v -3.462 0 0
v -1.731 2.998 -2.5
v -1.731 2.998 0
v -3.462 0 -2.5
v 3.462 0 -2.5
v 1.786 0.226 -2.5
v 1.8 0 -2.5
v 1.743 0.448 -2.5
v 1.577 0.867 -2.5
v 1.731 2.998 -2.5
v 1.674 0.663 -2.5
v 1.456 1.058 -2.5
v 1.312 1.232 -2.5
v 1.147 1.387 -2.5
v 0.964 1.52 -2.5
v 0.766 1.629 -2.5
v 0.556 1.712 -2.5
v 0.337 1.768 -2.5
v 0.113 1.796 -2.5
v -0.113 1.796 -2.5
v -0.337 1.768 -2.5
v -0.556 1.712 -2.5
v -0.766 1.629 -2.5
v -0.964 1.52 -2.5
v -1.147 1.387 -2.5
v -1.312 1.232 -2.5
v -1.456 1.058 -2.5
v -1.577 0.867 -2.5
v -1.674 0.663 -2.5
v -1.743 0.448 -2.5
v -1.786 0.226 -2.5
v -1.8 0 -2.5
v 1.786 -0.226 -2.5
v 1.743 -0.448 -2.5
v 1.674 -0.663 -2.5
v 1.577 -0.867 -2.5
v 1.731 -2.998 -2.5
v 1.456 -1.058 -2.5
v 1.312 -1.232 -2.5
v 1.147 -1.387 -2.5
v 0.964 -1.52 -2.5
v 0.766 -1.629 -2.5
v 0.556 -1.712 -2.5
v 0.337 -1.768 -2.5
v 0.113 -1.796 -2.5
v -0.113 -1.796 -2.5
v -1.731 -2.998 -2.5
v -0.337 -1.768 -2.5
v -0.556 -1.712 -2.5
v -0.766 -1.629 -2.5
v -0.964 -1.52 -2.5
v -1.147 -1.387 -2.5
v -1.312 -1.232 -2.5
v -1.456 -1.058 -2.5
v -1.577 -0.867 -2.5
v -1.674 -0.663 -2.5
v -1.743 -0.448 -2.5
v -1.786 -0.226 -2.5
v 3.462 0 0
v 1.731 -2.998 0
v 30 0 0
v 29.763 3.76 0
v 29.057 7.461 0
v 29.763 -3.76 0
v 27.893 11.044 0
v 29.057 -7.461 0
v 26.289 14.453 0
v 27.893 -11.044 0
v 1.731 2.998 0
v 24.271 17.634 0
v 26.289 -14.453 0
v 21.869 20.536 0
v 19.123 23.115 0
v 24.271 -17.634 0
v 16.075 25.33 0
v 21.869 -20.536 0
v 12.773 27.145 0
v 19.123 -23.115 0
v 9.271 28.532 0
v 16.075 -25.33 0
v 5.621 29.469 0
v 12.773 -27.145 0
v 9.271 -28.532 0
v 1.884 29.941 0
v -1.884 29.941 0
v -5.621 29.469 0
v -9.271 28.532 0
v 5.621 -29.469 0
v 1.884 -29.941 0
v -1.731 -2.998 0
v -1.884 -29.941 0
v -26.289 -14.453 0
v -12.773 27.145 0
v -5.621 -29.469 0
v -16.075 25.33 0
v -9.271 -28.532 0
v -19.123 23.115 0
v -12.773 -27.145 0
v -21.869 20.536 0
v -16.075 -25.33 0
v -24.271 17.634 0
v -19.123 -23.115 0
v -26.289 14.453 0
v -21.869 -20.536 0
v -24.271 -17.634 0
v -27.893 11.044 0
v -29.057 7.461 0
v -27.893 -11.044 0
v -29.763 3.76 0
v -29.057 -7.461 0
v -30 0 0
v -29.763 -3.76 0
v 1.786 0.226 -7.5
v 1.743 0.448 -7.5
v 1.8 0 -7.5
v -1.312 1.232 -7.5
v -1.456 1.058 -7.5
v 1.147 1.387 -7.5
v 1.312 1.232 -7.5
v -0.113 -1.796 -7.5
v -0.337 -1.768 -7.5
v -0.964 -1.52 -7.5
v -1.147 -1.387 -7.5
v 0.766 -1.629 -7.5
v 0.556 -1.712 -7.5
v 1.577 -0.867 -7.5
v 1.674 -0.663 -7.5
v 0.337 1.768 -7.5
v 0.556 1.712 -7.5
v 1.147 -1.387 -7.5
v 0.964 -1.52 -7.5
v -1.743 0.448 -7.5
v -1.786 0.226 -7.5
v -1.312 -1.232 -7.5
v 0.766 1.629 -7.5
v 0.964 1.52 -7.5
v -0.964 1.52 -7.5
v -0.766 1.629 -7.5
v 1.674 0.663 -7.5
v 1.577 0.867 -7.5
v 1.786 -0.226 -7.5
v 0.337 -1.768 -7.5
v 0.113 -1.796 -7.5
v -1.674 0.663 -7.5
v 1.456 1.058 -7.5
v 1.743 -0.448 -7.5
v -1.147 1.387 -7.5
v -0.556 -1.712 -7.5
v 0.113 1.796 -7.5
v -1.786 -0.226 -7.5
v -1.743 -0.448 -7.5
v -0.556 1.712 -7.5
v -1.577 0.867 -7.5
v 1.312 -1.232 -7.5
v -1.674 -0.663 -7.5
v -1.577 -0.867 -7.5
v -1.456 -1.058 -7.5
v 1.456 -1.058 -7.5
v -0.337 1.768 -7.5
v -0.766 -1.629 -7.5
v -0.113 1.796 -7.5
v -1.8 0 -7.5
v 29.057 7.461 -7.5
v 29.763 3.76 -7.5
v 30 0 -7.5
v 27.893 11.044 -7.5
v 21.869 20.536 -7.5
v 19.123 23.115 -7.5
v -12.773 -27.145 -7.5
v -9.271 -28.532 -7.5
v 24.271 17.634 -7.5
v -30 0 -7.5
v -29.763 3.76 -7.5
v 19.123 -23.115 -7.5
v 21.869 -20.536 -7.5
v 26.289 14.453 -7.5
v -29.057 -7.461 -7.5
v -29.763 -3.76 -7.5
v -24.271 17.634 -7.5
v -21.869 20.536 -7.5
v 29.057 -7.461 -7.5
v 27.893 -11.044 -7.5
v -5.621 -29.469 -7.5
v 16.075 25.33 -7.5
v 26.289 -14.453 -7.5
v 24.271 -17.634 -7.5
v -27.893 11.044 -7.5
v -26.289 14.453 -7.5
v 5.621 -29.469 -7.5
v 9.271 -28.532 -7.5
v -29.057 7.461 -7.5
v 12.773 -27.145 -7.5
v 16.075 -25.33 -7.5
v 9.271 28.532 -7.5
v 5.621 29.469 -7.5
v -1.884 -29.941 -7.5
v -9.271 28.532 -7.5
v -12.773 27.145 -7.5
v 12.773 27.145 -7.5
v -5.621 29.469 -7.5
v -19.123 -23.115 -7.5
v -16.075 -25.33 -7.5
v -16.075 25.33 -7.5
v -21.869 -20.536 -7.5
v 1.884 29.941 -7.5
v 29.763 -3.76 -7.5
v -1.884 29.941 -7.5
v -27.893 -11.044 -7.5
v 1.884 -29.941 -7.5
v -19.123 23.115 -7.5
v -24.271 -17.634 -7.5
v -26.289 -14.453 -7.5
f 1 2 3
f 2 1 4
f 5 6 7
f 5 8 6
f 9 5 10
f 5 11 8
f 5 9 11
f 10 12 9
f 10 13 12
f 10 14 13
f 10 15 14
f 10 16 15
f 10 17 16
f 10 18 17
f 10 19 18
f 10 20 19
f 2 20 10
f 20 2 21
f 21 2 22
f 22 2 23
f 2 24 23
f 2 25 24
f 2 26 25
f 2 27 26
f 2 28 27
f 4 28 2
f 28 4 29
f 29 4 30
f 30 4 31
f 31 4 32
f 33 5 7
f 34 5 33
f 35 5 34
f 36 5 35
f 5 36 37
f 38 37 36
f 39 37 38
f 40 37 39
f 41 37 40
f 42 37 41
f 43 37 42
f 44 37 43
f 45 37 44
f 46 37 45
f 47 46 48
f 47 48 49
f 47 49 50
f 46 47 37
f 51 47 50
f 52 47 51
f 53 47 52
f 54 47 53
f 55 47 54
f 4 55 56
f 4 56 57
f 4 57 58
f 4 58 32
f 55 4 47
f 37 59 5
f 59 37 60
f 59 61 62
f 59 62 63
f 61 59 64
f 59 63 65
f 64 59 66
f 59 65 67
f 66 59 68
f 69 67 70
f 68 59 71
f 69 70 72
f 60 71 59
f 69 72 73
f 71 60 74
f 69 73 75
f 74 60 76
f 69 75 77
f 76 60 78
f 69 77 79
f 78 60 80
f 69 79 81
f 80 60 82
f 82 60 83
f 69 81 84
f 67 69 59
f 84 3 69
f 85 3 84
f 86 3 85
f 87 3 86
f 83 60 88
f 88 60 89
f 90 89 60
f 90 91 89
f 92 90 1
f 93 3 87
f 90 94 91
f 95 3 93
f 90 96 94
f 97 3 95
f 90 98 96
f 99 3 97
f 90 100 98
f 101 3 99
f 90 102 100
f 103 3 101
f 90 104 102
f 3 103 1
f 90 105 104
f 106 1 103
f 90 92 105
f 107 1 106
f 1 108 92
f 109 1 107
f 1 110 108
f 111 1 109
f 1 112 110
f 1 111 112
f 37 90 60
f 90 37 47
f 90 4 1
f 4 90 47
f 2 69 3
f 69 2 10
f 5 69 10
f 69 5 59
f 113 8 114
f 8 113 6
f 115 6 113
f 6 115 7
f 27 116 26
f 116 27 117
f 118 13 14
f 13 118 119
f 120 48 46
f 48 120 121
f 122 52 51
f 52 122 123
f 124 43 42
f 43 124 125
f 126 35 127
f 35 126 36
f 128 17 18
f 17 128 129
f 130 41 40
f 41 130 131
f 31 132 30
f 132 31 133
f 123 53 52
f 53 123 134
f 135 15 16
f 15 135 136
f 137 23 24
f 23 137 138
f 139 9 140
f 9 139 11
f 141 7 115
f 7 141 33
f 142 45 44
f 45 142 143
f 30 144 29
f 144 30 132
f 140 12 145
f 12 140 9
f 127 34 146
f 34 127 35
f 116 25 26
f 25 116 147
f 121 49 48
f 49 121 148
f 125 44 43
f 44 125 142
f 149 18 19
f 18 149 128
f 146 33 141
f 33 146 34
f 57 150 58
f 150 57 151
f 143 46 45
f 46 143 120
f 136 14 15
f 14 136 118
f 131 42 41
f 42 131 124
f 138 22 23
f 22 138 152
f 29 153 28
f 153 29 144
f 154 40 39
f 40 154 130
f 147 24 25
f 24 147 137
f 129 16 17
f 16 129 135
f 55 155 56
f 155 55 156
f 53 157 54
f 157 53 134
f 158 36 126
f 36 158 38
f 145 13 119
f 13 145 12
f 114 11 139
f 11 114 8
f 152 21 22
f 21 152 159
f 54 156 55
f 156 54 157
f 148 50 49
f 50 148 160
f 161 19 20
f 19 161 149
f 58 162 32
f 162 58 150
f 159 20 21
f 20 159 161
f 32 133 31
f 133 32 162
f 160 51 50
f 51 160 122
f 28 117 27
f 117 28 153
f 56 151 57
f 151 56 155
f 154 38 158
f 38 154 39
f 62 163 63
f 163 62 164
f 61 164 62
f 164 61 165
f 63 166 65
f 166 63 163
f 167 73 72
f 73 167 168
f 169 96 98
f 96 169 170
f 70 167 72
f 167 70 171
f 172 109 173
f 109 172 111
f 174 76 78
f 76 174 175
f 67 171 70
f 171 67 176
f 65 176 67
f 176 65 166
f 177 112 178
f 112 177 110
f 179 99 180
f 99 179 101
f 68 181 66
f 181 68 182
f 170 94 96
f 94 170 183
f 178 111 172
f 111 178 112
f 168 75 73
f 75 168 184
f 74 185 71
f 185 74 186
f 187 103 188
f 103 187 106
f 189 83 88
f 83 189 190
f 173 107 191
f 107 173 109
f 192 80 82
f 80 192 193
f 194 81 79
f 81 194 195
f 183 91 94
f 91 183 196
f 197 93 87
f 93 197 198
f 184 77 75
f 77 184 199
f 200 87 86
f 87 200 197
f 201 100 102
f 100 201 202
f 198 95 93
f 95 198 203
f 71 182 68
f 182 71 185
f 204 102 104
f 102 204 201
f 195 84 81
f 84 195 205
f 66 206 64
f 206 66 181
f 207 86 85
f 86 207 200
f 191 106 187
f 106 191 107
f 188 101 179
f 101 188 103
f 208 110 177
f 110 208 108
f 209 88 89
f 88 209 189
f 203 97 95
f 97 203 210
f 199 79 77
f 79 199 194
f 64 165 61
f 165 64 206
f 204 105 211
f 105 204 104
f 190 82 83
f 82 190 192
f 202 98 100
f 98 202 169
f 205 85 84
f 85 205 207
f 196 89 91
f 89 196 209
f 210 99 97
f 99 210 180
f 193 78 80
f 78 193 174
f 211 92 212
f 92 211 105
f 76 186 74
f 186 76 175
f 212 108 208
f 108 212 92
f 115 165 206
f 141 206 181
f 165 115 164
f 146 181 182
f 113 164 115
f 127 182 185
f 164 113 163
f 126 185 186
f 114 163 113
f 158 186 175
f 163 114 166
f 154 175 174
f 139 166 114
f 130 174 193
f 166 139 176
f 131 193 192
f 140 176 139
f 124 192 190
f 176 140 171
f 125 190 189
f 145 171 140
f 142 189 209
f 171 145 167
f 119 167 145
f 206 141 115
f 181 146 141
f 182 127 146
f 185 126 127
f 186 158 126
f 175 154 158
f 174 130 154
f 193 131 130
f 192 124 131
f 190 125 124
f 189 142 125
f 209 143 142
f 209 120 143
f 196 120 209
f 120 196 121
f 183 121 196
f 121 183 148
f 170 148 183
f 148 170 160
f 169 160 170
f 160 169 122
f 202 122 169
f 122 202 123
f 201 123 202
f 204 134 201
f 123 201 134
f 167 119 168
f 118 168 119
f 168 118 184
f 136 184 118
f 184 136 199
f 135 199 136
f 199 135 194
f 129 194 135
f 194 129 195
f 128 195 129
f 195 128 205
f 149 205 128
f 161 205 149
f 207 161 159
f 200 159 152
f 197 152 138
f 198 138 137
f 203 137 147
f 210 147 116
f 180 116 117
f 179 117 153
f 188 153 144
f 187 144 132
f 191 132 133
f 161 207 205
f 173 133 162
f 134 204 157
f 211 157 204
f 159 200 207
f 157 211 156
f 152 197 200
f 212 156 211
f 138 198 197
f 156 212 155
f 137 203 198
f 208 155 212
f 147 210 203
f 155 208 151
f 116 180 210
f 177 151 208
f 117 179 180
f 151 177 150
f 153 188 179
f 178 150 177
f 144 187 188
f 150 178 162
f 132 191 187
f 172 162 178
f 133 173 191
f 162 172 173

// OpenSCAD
$fn = 50;

difference() {
	union() {
		translate(v = [0, 0, -7.5]) {
			cylinder(h = 7.5, r = 30.0);
		}
	}
	union() {
		translate(v = [0, 0, 0]) {
			rotate(a = [0, 0, 0]) {
				difference() {
					union() {
						translate(v = [0, 0, -2.5]) {
							linear_extrude(height = 2.5) {
								polygon(points = [[3.4619999999999997, 0.0], [1.7310000000000003, 2.9981799479017264], [-1.7309999999999992, 2.9981799479017264], [-3.4619999999999997, 4.2397272186481365e-16], [-1.7310000000000014, -2.998179947901726], [1.7309999999999977, -2.9981799479017277]]);
							}
						}
					}
					union();
				}
			}
		}
		#translate(v = [0, 0, -100.0]) {
			cylinder(h = 200, r = 1.8);
		}
	}
}
